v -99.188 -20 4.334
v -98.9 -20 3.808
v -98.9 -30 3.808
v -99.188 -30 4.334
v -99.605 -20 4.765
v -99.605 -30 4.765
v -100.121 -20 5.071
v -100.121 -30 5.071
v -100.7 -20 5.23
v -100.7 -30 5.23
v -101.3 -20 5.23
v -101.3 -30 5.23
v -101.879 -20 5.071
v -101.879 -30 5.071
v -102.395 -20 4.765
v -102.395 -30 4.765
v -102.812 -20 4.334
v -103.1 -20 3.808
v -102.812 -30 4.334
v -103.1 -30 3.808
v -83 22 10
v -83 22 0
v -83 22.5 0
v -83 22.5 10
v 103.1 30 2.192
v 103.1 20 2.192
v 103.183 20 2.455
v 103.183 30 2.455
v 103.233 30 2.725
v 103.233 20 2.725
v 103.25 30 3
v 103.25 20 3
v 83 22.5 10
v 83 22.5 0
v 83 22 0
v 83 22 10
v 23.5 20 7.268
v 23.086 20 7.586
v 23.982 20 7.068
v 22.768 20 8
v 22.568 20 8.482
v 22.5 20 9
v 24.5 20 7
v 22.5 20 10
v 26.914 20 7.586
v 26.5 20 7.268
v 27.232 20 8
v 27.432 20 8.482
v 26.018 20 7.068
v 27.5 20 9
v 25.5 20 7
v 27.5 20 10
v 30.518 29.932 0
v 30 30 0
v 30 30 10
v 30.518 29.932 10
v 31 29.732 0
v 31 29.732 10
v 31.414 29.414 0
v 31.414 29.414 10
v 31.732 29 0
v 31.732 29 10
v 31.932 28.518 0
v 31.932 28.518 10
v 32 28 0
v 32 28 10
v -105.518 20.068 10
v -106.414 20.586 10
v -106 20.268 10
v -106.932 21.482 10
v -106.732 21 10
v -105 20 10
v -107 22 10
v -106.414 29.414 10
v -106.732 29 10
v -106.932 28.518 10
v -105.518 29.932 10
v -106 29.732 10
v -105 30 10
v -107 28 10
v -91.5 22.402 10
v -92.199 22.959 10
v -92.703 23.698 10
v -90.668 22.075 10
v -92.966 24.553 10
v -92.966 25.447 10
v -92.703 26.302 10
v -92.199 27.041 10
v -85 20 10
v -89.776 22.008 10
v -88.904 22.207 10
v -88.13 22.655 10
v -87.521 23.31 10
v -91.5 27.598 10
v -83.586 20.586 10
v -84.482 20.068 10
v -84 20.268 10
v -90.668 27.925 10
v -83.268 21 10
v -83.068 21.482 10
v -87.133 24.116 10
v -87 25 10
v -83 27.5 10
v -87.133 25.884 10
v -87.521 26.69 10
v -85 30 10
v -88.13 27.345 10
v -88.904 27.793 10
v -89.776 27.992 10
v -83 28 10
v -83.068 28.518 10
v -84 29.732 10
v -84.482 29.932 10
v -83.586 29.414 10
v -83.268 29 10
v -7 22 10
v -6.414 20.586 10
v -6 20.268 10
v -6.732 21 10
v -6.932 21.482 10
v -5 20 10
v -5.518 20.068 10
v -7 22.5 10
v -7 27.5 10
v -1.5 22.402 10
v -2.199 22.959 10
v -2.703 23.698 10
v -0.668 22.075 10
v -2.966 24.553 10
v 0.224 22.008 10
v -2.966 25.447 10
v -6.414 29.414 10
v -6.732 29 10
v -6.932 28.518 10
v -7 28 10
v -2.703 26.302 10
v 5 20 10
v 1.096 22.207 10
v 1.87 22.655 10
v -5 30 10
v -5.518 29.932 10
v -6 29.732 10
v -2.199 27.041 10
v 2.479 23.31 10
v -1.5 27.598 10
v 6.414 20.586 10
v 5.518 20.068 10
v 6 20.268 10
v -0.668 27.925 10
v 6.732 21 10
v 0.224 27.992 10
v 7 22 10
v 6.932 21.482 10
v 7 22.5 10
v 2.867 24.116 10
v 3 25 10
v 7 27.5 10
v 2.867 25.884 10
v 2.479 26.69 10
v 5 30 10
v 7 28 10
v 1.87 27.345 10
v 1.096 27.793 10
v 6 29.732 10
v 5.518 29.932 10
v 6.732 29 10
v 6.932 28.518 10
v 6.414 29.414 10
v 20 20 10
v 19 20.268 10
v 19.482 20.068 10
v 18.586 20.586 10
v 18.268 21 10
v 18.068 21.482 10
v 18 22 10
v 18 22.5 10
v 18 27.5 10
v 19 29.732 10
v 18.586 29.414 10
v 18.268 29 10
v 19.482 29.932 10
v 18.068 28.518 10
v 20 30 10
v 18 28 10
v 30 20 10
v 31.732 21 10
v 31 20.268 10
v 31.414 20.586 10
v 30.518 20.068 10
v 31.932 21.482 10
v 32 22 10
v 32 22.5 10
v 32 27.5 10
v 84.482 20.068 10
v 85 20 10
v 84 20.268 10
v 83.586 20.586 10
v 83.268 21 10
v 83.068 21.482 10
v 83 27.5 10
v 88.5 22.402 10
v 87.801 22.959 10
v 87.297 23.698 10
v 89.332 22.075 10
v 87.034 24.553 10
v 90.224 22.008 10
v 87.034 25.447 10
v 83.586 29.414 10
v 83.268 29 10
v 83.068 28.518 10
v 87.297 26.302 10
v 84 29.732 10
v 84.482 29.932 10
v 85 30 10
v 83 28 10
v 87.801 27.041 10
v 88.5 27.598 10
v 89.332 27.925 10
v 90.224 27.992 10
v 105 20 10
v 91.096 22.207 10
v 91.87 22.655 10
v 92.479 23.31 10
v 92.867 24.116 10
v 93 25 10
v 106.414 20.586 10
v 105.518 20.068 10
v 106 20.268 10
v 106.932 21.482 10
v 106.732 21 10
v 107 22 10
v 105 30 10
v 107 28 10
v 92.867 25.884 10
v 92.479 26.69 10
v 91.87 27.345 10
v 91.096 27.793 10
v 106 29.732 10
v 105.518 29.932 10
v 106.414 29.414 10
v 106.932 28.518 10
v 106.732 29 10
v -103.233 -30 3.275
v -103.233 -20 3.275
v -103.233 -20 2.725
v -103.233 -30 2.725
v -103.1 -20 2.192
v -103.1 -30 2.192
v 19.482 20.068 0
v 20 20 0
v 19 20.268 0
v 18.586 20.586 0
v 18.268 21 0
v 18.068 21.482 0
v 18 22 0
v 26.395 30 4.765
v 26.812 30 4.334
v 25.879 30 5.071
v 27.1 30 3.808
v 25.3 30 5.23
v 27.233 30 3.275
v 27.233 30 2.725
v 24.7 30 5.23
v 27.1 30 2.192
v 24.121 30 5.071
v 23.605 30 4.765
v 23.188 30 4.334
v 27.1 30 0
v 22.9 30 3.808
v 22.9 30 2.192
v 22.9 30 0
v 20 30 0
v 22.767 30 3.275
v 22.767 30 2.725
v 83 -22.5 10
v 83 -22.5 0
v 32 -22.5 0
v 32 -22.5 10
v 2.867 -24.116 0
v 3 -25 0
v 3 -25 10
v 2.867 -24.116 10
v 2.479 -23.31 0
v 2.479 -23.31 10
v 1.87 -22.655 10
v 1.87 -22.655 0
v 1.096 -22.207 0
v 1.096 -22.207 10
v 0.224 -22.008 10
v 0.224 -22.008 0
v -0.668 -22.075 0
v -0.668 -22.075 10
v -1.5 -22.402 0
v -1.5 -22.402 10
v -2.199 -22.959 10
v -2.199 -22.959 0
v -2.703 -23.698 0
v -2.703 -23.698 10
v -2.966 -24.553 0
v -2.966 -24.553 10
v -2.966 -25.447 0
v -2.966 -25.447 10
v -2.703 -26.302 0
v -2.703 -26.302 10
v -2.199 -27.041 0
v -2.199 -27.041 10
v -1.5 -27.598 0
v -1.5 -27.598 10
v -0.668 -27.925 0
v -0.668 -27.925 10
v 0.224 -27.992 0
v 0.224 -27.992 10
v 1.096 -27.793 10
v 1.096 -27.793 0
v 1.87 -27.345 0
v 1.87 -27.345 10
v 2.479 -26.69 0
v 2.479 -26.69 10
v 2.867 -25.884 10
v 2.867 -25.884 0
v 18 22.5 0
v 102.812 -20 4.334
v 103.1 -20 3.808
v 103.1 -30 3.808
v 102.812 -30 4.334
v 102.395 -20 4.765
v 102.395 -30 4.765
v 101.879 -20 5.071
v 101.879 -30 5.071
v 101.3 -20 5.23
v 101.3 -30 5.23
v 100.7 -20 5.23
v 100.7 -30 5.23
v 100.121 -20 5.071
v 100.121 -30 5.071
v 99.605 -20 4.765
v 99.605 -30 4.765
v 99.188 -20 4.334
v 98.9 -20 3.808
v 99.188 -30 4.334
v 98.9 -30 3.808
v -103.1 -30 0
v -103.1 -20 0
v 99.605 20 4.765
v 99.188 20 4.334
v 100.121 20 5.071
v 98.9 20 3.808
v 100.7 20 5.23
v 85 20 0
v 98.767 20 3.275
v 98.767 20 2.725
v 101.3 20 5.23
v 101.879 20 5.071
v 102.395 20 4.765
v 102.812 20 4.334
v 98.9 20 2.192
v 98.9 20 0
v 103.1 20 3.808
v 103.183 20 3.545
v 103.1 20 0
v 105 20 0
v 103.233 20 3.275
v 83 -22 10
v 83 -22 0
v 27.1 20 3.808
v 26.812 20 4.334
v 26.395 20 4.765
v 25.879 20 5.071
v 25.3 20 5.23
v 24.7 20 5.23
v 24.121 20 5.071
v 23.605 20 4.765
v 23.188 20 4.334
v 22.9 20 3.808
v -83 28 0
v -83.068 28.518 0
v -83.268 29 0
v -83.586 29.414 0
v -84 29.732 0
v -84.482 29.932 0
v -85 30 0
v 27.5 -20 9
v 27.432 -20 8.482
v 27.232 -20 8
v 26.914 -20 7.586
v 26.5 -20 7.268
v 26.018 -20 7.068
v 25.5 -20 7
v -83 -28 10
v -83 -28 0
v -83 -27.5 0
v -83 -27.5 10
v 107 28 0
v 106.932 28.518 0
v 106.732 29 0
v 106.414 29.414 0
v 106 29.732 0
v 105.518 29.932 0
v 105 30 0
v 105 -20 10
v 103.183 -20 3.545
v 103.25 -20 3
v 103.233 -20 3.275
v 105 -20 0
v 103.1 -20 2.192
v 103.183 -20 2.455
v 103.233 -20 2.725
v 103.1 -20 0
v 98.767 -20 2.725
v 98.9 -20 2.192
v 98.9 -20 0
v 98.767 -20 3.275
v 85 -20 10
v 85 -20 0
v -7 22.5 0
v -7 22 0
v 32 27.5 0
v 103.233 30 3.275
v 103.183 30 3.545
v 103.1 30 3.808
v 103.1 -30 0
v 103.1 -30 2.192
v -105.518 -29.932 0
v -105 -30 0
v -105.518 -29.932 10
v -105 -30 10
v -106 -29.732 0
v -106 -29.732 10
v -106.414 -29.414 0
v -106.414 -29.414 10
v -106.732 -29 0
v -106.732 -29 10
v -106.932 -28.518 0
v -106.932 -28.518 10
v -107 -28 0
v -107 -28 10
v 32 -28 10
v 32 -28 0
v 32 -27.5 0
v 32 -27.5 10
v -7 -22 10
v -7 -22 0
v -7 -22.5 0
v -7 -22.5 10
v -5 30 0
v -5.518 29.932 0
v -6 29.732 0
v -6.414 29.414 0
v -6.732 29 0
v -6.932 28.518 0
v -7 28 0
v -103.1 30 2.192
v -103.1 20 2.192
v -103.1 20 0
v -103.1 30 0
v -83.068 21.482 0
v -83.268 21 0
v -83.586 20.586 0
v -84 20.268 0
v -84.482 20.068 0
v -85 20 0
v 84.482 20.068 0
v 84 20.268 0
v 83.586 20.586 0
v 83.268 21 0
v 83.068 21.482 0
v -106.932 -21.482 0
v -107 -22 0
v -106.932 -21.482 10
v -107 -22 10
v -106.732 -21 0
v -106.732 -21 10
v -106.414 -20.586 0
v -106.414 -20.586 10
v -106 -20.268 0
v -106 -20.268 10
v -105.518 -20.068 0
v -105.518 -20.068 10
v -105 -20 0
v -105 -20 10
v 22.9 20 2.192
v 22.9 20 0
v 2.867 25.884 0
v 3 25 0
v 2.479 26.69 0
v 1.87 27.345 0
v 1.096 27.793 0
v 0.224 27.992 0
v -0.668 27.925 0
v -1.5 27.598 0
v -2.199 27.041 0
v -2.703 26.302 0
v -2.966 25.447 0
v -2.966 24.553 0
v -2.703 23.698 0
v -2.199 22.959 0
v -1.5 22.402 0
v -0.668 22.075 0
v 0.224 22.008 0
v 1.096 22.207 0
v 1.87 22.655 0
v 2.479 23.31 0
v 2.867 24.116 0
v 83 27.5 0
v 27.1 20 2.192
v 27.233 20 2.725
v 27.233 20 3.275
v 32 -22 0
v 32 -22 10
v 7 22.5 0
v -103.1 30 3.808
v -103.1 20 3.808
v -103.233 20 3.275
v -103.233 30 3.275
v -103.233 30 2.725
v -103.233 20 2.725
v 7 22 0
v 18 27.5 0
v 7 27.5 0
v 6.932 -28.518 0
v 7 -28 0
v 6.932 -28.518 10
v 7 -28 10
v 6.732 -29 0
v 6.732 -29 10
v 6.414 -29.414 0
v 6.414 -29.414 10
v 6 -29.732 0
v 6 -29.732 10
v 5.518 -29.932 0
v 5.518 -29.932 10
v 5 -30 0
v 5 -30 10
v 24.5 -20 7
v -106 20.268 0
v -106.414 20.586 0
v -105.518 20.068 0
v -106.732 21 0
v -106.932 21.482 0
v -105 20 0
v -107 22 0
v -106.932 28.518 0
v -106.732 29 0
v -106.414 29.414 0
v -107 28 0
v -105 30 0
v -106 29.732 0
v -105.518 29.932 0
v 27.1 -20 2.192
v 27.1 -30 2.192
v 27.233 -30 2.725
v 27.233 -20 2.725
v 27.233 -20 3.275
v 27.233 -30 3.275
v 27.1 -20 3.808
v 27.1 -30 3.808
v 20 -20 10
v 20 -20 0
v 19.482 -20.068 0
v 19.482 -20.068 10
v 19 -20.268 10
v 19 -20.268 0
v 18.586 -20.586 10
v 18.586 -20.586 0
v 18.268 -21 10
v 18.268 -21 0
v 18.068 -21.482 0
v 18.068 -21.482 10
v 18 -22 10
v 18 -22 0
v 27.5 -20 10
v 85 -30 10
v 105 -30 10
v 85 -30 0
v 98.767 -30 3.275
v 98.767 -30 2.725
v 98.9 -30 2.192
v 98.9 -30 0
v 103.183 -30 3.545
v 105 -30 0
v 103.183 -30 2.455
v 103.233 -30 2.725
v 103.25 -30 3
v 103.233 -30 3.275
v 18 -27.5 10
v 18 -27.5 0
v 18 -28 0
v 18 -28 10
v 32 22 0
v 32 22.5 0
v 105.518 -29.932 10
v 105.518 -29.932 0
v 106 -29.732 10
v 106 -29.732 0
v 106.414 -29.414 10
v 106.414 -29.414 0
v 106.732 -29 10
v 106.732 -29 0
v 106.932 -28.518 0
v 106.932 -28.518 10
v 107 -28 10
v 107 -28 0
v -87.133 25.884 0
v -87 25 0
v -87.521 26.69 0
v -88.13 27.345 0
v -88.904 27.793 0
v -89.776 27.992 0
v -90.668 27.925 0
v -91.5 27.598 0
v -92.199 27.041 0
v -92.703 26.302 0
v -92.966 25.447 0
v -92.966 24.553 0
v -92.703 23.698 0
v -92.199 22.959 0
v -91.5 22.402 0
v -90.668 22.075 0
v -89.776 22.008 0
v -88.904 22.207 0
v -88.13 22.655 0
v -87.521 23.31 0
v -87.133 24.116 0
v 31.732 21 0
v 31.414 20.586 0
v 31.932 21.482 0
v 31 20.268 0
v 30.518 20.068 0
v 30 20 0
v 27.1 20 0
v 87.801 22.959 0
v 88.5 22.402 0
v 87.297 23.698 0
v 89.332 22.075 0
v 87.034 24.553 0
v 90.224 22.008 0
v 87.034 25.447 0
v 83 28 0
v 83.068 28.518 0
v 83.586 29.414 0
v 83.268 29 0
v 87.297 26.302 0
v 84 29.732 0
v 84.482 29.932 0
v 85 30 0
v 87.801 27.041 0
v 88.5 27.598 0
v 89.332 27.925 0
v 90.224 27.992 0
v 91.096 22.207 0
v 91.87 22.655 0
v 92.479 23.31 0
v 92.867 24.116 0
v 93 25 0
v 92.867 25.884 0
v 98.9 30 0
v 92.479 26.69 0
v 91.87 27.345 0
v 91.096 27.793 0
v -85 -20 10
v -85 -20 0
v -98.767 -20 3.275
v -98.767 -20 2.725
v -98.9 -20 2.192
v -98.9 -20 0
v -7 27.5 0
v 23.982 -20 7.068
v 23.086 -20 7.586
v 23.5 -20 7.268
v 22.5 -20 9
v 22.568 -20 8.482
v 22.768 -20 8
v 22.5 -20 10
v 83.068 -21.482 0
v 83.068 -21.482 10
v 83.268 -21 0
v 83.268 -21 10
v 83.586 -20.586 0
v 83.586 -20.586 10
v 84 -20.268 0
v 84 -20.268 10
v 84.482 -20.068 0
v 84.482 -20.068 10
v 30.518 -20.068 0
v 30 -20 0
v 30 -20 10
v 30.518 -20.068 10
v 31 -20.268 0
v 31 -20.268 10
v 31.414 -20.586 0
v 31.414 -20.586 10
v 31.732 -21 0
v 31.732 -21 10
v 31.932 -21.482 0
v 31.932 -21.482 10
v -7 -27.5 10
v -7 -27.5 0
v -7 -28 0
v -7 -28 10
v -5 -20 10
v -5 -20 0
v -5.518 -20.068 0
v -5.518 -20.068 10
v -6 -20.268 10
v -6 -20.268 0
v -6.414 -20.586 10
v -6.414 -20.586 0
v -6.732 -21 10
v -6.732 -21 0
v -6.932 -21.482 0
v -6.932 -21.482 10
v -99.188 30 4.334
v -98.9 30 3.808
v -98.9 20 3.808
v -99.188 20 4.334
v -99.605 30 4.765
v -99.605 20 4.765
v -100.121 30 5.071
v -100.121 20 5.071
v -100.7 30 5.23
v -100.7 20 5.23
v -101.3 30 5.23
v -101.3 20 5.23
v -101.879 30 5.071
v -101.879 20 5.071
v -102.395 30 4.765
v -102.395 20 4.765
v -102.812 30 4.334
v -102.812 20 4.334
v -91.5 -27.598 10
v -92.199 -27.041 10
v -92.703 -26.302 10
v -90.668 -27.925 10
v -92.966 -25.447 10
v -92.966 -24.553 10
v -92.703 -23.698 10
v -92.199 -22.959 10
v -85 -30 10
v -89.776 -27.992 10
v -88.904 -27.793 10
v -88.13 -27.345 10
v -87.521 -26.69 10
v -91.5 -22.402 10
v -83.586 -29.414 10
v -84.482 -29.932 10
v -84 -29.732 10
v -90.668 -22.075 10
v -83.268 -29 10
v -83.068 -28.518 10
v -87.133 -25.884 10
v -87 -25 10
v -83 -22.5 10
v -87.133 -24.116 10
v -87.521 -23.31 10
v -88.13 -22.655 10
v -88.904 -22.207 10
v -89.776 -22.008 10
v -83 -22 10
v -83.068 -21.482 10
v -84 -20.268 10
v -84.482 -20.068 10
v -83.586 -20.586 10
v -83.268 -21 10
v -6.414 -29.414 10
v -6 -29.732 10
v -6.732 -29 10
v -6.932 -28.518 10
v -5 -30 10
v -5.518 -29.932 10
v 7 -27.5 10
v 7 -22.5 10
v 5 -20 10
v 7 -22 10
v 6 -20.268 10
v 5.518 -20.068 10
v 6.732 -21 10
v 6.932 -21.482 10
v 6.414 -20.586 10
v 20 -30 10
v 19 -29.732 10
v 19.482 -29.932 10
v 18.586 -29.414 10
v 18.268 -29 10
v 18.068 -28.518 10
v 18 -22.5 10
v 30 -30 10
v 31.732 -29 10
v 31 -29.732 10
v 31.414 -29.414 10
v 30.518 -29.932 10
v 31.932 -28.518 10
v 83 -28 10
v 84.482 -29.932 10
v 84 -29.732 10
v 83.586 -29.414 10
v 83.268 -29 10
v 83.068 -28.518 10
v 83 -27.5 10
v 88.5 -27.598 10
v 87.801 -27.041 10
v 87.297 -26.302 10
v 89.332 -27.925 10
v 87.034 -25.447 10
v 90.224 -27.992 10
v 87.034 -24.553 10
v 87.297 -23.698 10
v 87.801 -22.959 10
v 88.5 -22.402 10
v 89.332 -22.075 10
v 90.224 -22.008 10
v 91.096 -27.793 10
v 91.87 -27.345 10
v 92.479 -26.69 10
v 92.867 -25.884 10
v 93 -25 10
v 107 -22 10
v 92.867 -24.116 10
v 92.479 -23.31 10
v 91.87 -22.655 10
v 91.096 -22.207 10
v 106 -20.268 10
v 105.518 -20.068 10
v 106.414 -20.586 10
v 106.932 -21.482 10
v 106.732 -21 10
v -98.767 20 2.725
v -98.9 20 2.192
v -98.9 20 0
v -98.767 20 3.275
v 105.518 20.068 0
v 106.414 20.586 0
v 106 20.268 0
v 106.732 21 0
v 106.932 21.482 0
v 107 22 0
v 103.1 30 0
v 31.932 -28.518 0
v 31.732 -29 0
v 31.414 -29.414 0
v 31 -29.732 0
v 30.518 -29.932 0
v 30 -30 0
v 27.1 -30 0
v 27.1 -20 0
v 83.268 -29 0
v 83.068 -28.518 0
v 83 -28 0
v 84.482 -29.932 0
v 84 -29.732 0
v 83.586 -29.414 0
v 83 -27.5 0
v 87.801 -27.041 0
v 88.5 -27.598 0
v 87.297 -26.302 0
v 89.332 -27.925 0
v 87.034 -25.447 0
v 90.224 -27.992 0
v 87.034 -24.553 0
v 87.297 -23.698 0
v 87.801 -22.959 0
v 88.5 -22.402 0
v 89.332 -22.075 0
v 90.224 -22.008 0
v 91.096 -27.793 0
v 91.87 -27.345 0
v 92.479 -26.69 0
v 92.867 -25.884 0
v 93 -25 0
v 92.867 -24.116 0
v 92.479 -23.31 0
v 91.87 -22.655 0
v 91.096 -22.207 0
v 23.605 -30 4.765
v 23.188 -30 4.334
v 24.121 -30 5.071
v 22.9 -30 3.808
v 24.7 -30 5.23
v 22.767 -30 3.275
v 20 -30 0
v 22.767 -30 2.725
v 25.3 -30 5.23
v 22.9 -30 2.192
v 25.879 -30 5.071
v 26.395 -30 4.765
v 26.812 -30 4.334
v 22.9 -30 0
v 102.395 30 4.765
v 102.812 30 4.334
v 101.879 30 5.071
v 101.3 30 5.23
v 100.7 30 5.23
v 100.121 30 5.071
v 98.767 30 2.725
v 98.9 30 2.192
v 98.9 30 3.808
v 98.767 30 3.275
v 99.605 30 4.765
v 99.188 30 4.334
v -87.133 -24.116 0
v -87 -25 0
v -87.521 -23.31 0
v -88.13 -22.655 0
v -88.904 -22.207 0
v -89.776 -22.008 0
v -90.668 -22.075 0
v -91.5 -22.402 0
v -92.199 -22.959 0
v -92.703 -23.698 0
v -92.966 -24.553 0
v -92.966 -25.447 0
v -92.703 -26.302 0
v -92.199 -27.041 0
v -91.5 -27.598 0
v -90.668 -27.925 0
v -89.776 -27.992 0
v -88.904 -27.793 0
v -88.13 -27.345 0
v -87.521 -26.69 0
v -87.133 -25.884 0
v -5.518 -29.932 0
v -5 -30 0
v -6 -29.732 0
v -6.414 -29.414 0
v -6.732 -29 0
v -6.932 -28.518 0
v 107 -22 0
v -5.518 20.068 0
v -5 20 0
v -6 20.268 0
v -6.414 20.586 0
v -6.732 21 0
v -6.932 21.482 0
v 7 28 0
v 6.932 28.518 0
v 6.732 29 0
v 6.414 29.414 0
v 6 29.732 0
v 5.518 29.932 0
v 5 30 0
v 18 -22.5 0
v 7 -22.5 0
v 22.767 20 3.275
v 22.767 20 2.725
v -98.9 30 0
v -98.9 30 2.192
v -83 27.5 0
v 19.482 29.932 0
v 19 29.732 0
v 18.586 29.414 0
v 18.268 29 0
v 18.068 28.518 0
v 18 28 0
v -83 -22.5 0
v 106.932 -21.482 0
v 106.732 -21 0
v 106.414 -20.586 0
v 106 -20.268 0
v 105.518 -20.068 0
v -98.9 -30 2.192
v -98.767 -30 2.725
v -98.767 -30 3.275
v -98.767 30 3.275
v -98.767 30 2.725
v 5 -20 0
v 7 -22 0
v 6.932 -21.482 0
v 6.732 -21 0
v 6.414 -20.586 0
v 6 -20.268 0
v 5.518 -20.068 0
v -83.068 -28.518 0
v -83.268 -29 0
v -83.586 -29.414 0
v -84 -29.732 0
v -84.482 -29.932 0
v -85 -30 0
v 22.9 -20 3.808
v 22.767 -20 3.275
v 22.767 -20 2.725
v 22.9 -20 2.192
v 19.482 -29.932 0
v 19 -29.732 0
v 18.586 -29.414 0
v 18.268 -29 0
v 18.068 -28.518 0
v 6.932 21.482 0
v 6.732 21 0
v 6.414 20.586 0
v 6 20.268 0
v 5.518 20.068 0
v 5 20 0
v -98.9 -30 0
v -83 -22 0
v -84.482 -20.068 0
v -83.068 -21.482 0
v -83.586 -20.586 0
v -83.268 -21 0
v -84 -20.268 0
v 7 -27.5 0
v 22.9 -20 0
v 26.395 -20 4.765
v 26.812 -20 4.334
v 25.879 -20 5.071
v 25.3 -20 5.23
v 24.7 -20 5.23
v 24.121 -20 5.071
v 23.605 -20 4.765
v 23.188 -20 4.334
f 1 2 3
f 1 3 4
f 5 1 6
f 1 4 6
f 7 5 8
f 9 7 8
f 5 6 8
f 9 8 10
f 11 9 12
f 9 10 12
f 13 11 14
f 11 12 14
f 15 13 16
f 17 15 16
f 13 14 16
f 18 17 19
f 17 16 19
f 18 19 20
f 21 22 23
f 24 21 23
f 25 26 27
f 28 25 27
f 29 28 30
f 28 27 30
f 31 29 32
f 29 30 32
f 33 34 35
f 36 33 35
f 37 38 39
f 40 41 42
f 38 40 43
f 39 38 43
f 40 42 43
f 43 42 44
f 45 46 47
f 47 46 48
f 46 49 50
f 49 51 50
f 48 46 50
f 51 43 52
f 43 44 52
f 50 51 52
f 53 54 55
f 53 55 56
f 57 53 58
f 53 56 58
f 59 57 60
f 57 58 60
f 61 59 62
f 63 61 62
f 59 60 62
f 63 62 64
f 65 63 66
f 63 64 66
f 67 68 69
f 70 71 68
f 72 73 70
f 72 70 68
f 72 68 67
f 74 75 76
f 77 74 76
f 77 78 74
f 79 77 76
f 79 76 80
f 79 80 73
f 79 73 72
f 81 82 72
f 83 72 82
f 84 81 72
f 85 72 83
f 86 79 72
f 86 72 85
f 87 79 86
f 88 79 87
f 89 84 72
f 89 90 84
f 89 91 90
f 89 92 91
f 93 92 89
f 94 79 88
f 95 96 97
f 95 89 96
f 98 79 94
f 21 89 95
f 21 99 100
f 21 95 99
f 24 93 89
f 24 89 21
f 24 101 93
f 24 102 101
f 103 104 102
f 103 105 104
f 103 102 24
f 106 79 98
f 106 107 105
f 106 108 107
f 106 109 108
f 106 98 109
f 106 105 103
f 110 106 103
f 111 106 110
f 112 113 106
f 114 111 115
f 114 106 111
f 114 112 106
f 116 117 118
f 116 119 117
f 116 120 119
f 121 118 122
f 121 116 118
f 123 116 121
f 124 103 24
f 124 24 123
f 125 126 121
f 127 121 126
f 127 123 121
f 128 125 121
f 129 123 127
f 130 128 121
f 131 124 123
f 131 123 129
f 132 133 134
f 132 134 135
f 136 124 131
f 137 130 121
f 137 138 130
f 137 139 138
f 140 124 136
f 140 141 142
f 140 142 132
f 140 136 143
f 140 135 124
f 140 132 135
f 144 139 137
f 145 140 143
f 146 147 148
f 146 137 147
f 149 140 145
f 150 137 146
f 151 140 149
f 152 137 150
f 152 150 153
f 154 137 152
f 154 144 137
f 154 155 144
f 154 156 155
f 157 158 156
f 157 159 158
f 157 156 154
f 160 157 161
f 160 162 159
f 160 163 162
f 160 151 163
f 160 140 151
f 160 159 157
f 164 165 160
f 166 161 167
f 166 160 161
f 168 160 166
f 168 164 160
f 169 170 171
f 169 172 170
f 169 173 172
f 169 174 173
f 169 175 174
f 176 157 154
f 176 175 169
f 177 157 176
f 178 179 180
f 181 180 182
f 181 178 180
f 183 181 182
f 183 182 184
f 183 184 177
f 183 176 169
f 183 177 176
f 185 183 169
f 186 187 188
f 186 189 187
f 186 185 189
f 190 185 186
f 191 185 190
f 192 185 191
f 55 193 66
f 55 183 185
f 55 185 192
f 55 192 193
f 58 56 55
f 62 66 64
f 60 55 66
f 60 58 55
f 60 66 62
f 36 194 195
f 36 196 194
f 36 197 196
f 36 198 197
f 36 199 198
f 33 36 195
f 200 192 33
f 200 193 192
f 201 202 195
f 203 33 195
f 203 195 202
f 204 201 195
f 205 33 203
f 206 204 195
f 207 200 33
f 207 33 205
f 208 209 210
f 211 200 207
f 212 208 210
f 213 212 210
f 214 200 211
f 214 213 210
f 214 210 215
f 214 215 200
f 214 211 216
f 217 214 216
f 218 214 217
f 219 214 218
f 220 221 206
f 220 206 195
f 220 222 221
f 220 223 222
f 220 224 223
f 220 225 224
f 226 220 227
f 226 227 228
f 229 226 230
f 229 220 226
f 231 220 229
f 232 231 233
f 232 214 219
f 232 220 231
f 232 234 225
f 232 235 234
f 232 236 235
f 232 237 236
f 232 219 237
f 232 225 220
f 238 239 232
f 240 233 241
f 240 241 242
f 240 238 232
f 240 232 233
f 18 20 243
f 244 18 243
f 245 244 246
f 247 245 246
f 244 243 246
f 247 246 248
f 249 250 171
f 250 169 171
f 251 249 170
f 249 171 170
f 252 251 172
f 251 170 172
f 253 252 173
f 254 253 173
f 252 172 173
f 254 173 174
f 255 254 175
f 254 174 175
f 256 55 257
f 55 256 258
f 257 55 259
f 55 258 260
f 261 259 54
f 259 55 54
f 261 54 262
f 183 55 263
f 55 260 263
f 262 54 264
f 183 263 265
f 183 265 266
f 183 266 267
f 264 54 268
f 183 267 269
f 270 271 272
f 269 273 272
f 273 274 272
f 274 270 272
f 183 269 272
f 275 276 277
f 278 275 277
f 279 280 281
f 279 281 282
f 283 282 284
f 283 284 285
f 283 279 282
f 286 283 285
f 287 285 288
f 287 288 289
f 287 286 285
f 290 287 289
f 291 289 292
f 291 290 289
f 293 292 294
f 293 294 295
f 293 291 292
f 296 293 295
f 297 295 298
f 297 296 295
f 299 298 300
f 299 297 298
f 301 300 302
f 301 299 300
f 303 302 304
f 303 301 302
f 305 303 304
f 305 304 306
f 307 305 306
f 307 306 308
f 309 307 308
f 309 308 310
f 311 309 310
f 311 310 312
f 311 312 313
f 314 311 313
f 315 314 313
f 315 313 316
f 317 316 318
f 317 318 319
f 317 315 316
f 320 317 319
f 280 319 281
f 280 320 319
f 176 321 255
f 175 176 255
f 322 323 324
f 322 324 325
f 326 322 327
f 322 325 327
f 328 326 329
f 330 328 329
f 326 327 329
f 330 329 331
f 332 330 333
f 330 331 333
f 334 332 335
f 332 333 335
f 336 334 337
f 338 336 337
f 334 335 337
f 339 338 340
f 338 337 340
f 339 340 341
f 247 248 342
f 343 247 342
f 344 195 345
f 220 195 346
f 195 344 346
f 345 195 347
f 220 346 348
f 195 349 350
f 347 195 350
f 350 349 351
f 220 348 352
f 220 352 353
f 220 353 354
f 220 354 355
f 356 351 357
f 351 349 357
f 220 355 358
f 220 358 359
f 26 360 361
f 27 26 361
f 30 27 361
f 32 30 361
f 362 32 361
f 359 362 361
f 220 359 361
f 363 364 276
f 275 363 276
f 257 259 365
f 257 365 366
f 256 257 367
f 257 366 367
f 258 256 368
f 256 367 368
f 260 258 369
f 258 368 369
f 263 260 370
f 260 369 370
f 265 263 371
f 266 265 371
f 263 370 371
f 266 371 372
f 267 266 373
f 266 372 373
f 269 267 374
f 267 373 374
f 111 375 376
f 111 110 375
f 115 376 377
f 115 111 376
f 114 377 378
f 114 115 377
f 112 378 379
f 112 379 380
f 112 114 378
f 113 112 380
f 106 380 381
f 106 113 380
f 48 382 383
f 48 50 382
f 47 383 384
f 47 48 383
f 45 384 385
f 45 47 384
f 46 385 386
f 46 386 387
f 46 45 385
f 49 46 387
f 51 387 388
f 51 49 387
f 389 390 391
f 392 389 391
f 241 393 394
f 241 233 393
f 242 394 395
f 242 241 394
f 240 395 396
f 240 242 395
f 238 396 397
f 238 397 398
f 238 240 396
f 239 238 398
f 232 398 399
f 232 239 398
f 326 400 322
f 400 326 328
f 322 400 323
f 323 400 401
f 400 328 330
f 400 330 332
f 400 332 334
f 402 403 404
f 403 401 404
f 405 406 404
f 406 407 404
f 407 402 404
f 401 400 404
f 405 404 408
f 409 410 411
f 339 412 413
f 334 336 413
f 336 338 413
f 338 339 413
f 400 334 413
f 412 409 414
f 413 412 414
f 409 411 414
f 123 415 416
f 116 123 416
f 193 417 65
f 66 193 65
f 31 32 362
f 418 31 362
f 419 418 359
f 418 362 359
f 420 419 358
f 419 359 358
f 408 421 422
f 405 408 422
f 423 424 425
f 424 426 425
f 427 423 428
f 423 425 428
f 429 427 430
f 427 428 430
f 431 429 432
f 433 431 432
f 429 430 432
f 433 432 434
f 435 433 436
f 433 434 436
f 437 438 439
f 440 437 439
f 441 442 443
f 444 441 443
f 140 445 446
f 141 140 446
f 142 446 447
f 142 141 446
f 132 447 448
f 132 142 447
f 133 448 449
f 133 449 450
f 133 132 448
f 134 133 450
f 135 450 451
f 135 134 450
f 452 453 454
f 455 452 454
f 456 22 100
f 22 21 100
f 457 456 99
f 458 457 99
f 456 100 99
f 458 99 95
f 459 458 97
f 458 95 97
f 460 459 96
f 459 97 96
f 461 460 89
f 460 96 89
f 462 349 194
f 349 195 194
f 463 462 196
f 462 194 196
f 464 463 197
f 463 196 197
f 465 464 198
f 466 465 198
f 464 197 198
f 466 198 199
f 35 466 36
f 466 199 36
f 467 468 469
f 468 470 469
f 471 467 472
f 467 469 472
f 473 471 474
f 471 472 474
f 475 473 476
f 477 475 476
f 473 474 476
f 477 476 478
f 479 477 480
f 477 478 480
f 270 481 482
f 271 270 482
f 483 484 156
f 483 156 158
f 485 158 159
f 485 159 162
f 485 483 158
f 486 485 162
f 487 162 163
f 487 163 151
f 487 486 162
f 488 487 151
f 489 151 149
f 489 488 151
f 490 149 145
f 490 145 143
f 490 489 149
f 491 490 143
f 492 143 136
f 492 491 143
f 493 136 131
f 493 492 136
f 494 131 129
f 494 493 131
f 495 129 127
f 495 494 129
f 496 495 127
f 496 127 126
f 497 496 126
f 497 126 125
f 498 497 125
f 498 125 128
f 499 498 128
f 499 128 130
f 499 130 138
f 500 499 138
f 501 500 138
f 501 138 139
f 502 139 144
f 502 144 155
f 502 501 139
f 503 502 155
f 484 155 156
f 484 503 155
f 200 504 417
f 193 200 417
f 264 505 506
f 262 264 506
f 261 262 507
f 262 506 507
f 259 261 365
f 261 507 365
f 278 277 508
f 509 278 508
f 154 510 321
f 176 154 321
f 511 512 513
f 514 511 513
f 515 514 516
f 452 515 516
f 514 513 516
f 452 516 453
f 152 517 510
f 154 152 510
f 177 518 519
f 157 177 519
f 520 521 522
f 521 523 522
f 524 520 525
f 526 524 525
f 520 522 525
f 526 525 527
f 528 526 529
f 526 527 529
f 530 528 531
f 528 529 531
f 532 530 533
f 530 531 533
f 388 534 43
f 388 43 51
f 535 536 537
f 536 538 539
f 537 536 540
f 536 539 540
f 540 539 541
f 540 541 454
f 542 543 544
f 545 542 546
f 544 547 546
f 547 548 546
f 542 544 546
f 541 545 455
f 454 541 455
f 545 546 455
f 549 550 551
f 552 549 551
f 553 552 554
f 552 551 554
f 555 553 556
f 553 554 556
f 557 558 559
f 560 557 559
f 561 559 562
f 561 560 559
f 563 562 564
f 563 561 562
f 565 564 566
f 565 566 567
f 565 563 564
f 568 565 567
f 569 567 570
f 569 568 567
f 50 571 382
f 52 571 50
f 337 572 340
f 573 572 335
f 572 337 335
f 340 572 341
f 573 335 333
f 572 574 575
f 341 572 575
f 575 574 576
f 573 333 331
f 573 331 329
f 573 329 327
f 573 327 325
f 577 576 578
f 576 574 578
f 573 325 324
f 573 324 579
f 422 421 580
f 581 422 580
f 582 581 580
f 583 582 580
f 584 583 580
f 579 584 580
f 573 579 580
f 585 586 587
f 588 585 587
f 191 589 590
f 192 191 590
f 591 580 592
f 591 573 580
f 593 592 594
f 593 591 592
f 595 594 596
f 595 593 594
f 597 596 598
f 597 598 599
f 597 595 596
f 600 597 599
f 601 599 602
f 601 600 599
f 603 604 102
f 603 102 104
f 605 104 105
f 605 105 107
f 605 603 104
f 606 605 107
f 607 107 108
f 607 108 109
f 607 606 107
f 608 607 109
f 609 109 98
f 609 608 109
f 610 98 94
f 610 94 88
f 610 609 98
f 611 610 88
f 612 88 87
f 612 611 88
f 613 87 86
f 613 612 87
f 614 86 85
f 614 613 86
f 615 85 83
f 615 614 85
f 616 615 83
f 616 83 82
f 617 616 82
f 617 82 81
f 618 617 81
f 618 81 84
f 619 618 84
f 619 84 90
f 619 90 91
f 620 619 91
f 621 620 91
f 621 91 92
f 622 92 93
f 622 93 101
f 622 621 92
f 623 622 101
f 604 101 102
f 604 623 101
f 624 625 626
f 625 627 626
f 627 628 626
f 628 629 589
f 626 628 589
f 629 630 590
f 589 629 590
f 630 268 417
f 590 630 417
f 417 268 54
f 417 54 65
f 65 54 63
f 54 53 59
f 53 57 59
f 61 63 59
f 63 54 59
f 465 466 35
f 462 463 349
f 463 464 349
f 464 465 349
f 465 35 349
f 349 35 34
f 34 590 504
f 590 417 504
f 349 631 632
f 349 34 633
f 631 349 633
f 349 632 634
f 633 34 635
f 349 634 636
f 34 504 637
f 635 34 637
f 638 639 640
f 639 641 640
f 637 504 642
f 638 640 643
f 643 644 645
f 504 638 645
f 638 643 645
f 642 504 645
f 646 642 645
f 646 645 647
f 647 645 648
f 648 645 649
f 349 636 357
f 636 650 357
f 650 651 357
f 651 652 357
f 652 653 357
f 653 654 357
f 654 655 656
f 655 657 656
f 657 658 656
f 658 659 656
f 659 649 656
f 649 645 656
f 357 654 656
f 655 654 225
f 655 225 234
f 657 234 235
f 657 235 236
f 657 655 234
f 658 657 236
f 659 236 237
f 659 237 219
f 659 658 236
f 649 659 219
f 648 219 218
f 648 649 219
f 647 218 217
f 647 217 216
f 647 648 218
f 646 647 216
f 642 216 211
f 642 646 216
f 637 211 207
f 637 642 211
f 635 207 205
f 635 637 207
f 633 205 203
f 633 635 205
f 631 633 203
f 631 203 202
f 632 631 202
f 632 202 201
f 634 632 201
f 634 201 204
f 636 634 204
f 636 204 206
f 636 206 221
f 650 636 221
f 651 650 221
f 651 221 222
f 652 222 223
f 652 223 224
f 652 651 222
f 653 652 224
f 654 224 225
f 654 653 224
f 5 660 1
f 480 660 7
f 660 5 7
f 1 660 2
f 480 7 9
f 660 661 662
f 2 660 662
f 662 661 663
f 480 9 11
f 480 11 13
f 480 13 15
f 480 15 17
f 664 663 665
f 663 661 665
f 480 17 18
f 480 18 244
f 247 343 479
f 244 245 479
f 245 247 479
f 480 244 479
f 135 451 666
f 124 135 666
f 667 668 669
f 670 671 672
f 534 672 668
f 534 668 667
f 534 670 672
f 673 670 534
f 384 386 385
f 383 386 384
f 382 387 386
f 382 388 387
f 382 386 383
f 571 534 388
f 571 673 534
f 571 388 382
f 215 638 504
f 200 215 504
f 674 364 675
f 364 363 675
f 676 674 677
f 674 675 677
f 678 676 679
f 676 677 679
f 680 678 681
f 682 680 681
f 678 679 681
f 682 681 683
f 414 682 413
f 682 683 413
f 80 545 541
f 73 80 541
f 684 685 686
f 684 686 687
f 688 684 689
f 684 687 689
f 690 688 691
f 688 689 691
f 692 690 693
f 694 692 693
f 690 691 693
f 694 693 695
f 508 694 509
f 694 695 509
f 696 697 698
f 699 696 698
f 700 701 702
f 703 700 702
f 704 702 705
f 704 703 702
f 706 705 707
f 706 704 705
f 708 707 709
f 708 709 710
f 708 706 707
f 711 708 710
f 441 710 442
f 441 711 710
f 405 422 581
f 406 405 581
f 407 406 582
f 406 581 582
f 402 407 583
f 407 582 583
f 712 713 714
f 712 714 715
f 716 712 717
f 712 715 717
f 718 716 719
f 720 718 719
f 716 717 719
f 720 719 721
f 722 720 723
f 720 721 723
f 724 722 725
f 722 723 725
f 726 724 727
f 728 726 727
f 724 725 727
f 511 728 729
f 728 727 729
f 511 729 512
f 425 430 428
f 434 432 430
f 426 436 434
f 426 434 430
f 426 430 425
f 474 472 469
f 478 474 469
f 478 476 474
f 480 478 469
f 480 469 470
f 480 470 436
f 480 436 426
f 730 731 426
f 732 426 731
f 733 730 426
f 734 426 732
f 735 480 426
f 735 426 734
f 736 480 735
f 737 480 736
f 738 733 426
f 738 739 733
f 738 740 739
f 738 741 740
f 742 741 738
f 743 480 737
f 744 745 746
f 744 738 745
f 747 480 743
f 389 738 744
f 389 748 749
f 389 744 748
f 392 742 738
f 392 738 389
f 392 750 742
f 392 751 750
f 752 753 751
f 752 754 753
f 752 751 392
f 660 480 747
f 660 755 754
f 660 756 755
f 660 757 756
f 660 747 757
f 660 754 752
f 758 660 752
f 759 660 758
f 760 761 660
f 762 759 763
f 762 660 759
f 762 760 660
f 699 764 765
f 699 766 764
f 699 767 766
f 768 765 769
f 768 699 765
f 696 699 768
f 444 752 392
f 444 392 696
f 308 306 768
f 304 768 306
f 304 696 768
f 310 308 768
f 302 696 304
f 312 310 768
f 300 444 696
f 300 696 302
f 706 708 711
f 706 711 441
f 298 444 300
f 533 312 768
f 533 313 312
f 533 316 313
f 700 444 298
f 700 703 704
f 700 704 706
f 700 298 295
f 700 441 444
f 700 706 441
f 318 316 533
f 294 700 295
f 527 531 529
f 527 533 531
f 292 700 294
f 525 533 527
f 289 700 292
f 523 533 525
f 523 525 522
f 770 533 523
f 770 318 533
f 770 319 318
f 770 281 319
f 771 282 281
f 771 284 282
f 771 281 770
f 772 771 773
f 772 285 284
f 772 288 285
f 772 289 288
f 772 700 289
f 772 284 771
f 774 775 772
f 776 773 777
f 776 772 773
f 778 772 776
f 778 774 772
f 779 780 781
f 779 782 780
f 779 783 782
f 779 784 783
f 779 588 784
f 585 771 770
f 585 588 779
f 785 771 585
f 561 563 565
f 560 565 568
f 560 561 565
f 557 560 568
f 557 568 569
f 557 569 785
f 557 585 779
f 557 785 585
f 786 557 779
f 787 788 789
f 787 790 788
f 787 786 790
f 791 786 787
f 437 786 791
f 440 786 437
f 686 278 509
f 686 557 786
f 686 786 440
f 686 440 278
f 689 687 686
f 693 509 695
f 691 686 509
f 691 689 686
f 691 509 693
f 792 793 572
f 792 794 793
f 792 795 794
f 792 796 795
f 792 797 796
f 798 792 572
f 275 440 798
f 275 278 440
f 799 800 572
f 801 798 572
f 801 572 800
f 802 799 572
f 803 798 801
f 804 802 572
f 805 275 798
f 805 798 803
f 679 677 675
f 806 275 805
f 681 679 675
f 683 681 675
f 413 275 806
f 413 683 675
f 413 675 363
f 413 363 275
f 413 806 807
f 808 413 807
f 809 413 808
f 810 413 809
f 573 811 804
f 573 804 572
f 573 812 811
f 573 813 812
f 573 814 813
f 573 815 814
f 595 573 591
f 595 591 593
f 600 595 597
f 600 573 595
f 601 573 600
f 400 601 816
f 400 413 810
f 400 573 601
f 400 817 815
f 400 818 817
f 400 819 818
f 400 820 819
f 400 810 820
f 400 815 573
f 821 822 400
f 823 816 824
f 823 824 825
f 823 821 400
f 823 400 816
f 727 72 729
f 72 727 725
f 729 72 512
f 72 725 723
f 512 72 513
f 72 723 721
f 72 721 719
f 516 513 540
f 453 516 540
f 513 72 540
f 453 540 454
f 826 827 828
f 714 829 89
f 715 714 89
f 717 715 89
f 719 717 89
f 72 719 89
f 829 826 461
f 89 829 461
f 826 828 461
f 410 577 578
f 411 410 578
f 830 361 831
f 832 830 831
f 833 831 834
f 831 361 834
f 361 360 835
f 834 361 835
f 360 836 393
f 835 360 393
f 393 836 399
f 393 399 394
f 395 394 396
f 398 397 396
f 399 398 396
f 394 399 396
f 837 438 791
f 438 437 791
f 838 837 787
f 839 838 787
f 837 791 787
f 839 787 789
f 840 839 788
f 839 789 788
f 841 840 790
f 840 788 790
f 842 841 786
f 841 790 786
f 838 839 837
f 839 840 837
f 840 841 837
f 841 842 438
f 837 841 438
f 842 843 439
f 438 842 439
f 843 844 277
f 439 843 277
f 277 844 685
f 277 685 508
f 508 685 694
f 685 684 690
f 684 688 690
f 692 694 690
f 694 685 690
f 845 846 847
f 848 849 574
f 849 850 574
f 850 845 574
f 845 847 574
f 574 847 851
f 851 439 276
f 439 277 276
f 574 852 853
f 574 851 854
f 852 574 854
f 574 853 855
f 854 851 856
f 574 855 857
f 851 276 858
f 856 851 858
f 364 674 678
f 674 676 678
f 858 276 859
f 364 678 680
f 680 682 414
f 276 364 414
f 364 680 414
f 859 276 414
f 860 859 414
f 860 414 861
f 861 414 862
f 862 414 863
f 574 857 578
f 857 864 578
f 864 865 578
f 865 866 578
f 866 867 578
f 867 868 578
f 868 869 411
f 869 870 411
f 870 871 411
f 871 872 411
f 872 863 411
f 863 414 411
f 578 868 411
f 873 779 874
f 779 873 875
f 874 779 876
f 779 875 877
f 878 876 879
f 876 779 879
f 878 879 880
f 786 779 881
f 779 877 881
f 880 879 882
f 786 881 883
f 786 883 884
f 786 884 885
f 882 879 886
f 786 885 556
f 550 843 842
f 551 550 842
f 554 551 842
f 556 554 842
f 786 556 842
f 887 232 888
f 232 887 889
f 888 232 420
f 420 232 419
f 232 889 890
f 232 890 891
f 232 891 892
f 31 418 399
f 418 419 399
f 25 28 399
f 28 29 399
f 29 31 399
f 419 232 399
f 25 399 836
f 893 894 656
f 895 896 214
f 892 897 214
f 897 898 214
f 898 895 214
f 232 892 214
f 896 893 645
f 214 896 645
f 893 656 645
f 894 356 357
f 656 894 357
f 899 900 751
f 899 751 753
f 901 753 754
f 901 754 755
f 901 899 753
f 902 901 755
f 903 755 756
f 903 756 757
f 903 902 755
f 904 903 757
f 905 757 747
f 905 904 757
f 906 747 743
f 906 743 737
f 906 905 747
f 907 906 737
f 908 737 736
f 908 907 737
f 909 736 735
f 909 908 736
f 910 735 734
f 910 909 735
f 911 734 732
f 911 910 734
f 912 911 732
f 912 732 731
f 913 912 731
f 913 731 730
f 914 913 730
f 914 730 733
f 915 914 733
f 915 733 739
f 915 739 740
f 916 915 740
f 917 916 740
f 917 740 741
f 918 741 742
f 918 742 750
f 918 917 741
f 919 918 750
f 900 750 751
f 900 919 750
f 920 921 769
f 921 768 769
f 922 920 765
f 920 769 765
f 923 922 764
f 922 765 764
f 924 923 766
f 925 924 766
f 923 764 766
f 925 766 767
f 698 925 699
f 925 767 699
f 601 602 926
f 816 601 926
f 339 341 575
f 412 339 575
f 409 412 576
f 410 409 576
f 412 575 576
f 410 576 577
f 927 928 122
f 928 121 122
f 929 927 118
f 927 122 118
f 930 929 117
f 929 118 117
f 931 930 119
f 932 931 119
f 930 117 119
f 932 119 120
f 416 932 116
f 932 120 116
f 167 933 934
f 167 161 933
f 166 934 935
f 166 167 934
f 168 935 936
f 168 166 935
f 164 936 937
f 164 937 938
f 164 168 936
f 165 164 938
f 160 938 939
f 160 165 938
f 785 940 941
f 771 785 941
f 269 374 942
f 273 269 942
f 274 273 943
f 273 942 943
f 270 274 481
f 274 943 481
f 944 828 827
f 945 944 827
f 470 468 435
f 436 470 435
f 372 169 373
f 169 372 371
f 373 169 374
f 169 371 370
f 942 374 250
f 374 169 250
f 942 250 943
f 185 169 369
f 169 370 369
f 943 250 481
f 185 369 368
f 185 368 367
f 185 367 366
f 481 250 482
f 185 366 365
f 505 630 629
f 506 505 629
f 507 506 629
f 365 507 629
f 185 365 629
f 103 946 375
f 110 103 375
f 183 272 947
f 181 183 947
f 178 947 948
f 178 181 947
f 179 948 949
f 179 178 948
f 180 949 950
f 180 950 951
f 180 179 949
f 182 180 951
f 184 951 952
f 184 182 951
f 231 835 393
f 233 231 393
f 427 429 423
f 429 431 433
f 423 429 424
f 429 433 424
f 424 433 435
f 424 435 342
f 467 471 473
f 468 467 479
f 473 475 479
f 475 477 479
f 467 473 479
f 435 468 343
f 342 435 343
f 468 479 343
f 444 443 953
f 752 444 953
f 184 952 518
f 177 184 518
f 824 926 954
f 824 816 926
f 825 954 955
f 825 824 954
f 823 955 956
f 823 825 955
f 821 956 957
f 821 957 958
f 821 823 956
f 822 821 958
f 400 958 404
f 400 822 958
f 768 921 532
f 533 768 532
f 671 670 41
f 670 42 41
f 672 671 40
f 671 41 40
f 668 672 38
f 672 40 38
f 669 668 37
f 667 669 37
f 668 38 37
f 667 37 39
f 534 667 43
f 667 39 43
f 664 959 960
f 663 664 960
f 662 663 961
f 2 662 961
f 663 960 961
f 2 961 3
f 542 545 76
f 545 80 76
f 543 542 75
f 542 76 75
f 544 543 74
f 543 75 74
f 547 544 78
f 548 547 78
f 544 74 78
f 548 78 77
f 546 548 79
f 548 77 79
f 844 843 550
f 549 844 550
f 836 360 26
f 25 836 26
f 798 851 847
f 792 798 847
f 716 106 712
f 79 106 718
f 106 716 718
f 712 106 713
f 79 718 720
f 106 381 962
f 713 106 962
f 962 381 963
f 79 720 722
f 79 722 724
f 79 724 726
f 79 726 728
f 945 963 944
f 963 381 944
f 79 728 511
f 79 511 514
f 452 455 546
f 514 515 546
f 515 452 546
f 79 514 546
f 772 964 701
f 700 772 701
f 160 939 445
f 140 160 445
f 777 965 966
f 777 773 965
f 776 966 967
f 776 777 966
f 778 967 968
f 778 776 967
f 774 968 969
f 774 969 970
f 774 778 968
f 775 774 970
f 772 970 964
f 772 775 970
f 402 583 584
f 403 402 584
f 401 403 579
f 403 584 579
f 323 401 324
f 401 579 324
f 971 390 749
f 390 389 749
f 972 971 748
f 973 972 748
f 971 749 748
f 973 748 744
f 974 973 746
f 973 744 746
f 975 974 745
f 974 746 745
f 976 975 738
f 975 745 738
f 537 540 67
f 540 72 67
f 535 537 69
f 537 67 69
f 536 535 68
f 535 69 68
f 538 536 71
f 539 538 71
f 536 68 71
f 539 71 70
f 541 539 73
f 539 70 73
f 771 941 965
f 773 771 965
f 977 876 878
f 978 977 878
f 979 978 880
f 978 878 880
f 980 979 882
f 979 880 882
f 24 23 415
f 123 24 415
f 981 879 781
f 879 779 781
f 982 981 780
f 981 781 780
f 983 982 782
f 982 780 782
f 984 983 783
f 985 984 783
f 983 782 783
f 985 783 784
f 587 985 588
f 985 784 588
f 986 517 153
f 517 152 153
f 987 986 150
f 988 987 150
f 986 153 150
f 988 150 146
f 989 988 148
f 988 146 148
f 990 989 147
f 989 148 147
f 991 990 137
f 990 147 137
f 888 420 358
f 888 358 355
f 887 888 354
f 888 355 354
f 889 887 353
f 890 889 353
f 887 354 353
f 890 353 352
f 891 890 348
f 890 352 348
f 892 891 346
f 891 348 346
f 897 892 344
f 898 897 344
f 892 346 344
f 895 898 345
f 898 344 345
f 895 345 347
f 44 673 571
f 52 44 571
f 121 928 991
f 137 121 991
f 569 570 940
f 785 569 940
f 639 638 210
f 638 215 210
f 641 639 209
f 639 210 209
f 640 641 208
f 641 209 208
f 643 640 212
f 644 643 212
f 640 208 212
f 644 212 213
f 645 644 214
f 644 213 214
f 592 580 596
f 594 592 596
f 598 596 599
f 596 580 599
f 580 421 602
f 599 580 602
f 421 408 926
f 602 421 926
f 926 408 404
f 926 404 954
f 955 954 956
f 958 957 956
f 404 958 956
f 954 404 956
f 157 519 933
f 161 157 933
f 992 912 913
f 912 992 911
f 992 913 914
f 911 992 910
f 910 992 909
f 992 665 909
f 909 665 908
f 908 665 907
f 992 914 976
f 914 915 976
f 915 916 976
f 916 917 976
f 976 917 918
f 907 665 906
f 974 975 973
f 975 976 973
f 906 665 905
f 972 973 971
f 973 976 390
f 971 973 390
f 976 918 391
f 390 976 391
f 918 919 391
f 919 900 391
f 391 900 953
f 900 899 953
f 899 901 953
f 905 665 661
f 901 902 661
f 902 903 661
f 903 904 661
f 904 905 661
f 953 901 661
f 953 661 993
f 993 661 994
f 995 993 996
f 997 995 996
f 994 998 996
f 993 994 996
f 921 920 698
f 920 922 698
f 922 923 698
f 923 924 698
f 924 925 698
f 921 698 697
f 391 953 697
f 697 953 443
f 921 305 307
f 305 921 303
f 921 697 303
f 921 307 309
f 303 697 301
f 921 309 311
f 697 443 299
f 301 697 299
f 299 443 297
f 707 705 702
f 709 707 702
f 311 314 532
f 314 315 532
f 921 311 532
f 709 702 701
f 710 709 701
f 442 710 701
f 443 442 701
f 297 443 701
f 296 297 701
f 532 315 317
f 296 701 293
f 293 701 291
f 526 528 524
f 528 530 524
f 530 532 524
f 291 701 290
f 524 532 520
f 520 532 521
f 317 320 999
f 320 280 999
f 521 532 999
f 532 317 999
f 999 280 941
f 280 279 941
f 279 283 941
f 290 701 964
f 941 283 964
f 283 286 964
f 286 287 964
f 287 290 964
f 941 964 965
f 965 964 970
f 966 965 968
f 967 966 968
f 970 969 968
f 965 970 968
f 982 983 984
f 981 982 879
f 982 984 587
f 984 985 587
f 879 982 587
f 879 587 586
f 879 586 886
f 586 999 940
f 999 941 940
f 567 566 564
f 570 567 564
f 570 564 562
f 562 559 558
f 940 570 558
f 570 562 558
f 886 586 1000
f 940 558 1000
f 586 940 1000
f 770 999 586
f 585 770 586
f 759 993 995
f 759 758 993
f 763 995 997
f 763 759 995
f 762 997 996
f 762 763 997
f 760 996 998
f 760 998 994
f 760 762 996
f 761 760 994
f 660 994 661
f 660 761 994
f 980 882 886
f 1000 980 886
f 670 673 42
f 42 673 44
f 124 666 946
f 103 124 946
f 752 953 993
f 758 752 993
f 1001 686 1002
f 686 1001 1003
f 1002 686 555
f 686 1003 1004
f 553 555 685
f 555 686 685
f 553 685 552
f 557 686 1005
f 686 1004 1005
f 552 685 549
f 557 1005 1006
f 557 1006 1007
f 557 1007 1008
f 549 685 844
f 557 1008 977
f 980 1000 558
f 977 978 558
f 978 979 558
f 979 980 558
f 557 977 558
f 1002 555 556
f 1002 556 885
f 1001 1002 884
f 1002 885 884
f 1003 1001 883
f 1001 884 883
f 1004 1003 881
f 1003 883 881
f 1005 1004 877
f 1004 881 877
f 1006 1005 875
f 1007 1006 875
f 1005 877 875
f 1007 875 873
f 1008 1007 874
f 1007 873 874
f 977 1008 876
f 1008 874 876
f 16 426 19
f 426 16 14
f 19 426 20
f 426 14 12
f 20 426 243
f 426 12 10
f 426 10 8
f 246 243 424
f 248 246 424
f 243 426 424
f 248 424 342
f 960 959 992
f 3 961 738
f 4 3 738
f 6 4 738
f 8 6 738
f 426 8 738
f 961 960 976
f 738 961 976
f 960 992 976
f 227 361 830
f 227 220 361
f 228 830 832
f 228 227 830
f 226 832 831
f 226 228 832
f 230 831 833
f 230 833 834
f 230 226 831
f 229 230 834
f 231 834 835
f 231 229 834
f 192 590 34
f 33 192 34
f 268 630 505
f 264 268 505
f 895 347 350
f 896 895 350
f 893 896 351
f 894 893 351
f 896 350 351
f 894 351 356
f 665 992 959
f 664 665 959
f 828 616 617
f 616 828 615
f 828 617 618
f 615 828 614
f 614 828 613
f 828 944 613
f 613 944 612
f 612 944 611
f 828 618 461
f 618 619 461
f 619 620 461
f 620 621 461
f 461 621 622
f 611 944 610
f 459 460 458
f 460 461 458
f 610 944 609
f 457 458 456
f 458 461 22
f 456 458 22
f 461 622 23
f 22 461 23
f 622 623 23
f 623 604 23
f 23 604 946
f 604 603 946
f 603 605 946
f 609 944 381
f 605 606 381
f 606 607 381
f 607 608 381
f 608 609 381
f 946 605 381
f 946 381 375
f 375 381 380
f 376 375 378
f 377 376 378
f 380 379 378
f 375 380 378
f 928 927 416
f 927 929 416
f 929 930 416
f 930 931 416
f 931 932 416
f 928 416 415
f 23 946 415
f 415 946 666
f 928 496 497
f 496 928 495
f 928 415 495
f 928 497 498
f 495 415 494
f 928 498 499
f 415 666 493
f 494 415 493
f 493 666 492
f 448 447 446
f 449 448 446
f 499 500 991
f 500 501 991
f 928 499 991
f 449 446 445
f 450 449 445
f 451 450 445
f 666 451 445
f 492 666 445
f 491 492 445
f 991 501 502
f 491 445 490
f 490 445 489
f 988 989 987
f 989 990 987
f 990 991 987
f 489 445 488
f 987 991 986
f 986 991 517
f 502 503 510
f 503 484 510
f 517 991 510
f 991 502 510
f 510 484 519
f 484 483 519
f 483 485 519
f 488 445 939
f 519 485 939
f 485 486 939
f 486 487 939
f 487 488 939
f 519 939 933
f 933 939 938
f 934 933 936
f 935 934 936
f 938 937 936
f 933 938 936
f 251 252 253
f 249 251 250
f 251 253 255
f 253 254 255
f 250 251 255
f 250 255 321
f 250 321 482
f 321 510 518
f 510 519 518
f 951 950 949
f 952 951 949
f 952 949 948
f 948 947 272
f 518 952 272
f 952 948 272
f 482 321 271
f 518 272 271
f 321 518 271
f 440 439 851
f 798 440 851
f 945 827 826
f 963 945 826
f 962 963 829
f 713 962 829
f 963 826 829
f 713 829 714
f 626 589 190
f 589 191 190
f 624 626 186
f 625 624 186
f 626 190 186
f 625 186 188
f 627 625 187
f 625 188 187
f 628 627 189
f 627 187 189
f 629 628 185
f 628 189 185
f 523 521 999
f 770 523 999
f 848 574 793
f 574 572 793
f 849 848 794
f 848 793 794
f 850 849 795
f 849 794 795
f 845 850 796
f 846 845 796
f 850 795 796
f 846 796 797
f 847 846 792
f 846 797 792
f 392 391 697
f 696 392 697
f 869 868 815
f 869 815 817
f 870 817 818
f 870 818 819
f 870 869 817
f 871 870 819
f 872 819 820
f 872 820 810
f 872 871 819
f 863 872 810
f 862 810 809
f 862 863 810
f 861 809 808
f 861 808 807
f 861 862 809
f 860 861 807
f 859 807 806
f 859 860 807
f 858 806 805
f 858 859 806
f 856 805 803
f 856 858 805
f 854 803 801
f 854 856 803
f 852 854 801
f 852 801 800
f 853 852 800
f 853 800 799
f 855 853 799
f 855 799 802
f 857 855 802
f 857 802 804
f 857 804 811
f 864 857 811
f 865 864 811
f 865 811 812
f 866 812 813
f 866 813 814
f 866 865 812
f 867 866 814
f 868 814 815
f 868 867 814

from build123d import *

# Parameters (mm, degrees)
F0_R     = 3
F1_DEPTH = 10
F3_DEPTH = 70
F4_R     = 2
F4_2_R   = 2
F5_W     = 5
F5_H     = 40
F6_DEPTH = 3
F7_R     = 2


with BuildPart() as f1:
    # F0 (on Top) → F1 (new body)
    with BuildSketch(Plane.XY):
        Polygon((83, 20), (107, 20), (107, 30), (83, 30), (83, 27.5), (32, 27.5), (32, 30), (18, 30), (18, 27.5), (7, 27.5), (7, 30), (-7, 30), (-7, 27.5), (-83, 27.5), (-83, 30), (-107, 30), (-107, 20), (-83, 20), (-83, 22.5), (-7, 22.5), (-7, 20), (7, 20), (7, 22.5), (18, 22.5), (18, 20), (32, 20), (32, 22.5), (83, 22.5), align=None)
        with Locations((-90, 25)):
            Circle(F0_R, mode=Mode.SUBTRACT)
        with Locations((0, 25)):
            Circle(F0_R, mode=Mode.SUBTRACT)
        with Locations((90, 25)):
            Circle(F0_R, mode=Mode.SUBTRACT)
    extrude(amount=F1_DEPTH)


with BuildPart() as f1b:
    # F0 (on Top) → F1, piece 2 (new body)
    with BuildSketch(Plane.XY):
        Polygon((83, -30), (107, -30), (107, -20), (83, -20), (83, -22.5), (32, -22.5), (32, -20), (18, -20), (18, -22.5), (7, -22.5), (7, -20), (-7, -20), (-7, -22.5), (-83, -22.5), (-83, -20), (-107, -20), (-107, -30), (-83, -30), (-83, -27.5), (-7, -27.5), (-7, -30), (7, -30), (7, -27.5), (18, -27.5), (18, -30), (32, -30), (32, -27.5), (83, -27.5), align=None)
        with Locations((-90, -25)):
            Circle(F0_R, mode=Mode.SUBTRACT)
        with Locations((0, -25)):
            Circle(F0_R, mode=Mode.SUBTRACT)
        with Locations((90, -25)):
            Circle(F0_R, mode=Mode.SUBTRACT)
    extrude(amount=F1_DEPTH)


with BuildPart() as f3_tool:
    # F2 (on face) → F3 (new body)
    with BuildSketch(Plane.XZ.offset(30)):
        with BuildLine():
            ThreePointArc((103.1, 2.1922252789), (103.2121821806, 2.5892080819), (103.25, 3))
            ThreePointArc((103.25, 3), (103.2121821806, 3.4107919181), (103.1, 3.8077747211))
            ThreePointArc((103.1, 3.8077747211), (101, 5.25), (98.9, 3.8077747211))
            ThreePointArc((98.9, 3.8077747211), (98.75, 3), (98.9, 2.1922252789))
            ThreePointArc((98.9, 2.1922252789), (101, 0.75), (103.1, 2.1922252789))
        make_face()
        with BuildLine():
            Line((103.1, -1.3476219028), (103.1, 2.1922252789))
            ThreePointArc((103.1, 2.1922252789), (101, 0.75), (98.9, 2.1922252789))
            Line((98.9, 2.1922252789), (98.9, -1.3476219028))
            Line((98.9, -1.3476219028), (103.1, -1.3476219028))
        make_face()
        with BuildLine():
            Line((-103.1, 2.1922252789), (-103.1, 0.0061060628))
            Line((-103.1, 0.0061060628), (-103.1, -2.6691132225))
            Line((-103.1, -2.6691132225), (-98.9, -2.6691132225))
            Line((-98.9, -2.6691132225), (-98.9, -0.0081721373))
            Line((-98.9, -0.0081721373), (-98.9, 2.1922252789))
            ThreePointArc((-98.9, 2.1922252789), (-101, 0.75), (-103.1, 2.1922252789))
        make_face()
        with BuildLine():
            ThreePointArc((-103.1, 3.8077747211), (-103.25, 3), (-103.1, 2.1922252789))
            ThreePointArc((-103.1, 2.1922252789), (-101, 0.75), (-98.9, 2.1922252789))
            ThreePointArc((-98.9, 2.1922252789), (-98.75, 3), (-98.9, 3.8077747211))
            ThreePointArc((-98.9, 3.8077747211), (-101, 5.25), (-103.1, 3.8077747211))
        make_face()
        with BuildLine():
            Line((22.9, 2.1922252789), (22.9, -4.3147648685))
            Line((22.9, -4.3147648685), (27.1, -4.3147648685))
            Line((27.1, -4.3147648685), (27.1, 2.1922252789))
            ThreePointArc((27.1, 2.1922252789), (25, 0.75), (22.9, 2.1922252789))
        make_face()
        with BuildLine():
            ThreePointArc((22.9, 3.8077747211), (22.75, 3), (22.9, 2.1922252789))
            ThreePointArc((22.9, 2.1922252789), (25, 0.75), (27.1, 2.1922252789))
            ThreePointArc((27.1, 2.1922252789), (27.25, 3), (27.1, 3.8077747211))
            ThreePointArc((27.1, 3.8077747211), (25, 5.25), (22.9, 3.8077747211))
        make_face()
    extrude(amount=-F3_DEPTH)


with BuildPart() as f1_1:
    add(f1.part)

    # F3: cut by f3_tool
    add(f3_tool.part, mode=Mode.SUBTRACT)

    # F4
    f4_edges = [f1_1.edges().sort_by_distance(p)[0] for p in [
        (-107, 20, 5),
        (-107, 30, 5),
        (-7, 20, 5),
        (-7, 30, 5),
        (18, 20, 5),
        (18, 30, 5),
        (83, 20, 5),
        (83, 30, 5),
        (-83, 20, 5),
        (-83, 30, 5),
        (7, 20, 5),
        (7, 30, 5),
        (32, 30, 5),
        (32, 20, 5),
        (107, 20, 5),
        (107, 30, 5),
    ]]
    fillet(f4_edges, radius=F4_R)


with BuildPart() as f1b_1:
    add(f1b.part)

    # F3: cut by f3_tool
    add(f3_tool.part, mode=Mode.SUBTRACT)

    # F4#2
    f4_2_edges = [f1b_1.edges().sort_by_distance(p)[0] for p in [
        (-83, -30, 5),
        (-83, -20, 5),
        (-107, -30, 5),
        (-107, -20, 5),
        (-7, -20, 5),
        (18, -20, 5),
        (-7, -30, 5),
        (18, -30, 5),
        (83, -20, 5),
        (83, -30, 5),
        (107, -30, 5),
        (107, -20, 5),
        (32, -20, 5),
        (32, -30, 5),
        (7, -30, 5),
        (7, -20, 5),
    ]]
    fillet(f4_2_edges, radius=F4_2_R)


with BuildPart() as f6:
    # F5 (on face) → F6 (new body)
    with BuildSketch(Plane.XY.offset(10)):
        with Locations((25, 0)):
            Rectangle(F5_W, F5_H)
    extrude(amount=-F6_DEPTH)

    # F7
    f7_edges = [f6.edges().sort_by_distance(p)[0] for p in [
        (27.5, 0, 7),
        (22.5, 0, 7),
    ]]
    fillet(f7_edges, radius=F7_R)


solid = Compound([f1_1.part, f1b_1.part, f6.part])
